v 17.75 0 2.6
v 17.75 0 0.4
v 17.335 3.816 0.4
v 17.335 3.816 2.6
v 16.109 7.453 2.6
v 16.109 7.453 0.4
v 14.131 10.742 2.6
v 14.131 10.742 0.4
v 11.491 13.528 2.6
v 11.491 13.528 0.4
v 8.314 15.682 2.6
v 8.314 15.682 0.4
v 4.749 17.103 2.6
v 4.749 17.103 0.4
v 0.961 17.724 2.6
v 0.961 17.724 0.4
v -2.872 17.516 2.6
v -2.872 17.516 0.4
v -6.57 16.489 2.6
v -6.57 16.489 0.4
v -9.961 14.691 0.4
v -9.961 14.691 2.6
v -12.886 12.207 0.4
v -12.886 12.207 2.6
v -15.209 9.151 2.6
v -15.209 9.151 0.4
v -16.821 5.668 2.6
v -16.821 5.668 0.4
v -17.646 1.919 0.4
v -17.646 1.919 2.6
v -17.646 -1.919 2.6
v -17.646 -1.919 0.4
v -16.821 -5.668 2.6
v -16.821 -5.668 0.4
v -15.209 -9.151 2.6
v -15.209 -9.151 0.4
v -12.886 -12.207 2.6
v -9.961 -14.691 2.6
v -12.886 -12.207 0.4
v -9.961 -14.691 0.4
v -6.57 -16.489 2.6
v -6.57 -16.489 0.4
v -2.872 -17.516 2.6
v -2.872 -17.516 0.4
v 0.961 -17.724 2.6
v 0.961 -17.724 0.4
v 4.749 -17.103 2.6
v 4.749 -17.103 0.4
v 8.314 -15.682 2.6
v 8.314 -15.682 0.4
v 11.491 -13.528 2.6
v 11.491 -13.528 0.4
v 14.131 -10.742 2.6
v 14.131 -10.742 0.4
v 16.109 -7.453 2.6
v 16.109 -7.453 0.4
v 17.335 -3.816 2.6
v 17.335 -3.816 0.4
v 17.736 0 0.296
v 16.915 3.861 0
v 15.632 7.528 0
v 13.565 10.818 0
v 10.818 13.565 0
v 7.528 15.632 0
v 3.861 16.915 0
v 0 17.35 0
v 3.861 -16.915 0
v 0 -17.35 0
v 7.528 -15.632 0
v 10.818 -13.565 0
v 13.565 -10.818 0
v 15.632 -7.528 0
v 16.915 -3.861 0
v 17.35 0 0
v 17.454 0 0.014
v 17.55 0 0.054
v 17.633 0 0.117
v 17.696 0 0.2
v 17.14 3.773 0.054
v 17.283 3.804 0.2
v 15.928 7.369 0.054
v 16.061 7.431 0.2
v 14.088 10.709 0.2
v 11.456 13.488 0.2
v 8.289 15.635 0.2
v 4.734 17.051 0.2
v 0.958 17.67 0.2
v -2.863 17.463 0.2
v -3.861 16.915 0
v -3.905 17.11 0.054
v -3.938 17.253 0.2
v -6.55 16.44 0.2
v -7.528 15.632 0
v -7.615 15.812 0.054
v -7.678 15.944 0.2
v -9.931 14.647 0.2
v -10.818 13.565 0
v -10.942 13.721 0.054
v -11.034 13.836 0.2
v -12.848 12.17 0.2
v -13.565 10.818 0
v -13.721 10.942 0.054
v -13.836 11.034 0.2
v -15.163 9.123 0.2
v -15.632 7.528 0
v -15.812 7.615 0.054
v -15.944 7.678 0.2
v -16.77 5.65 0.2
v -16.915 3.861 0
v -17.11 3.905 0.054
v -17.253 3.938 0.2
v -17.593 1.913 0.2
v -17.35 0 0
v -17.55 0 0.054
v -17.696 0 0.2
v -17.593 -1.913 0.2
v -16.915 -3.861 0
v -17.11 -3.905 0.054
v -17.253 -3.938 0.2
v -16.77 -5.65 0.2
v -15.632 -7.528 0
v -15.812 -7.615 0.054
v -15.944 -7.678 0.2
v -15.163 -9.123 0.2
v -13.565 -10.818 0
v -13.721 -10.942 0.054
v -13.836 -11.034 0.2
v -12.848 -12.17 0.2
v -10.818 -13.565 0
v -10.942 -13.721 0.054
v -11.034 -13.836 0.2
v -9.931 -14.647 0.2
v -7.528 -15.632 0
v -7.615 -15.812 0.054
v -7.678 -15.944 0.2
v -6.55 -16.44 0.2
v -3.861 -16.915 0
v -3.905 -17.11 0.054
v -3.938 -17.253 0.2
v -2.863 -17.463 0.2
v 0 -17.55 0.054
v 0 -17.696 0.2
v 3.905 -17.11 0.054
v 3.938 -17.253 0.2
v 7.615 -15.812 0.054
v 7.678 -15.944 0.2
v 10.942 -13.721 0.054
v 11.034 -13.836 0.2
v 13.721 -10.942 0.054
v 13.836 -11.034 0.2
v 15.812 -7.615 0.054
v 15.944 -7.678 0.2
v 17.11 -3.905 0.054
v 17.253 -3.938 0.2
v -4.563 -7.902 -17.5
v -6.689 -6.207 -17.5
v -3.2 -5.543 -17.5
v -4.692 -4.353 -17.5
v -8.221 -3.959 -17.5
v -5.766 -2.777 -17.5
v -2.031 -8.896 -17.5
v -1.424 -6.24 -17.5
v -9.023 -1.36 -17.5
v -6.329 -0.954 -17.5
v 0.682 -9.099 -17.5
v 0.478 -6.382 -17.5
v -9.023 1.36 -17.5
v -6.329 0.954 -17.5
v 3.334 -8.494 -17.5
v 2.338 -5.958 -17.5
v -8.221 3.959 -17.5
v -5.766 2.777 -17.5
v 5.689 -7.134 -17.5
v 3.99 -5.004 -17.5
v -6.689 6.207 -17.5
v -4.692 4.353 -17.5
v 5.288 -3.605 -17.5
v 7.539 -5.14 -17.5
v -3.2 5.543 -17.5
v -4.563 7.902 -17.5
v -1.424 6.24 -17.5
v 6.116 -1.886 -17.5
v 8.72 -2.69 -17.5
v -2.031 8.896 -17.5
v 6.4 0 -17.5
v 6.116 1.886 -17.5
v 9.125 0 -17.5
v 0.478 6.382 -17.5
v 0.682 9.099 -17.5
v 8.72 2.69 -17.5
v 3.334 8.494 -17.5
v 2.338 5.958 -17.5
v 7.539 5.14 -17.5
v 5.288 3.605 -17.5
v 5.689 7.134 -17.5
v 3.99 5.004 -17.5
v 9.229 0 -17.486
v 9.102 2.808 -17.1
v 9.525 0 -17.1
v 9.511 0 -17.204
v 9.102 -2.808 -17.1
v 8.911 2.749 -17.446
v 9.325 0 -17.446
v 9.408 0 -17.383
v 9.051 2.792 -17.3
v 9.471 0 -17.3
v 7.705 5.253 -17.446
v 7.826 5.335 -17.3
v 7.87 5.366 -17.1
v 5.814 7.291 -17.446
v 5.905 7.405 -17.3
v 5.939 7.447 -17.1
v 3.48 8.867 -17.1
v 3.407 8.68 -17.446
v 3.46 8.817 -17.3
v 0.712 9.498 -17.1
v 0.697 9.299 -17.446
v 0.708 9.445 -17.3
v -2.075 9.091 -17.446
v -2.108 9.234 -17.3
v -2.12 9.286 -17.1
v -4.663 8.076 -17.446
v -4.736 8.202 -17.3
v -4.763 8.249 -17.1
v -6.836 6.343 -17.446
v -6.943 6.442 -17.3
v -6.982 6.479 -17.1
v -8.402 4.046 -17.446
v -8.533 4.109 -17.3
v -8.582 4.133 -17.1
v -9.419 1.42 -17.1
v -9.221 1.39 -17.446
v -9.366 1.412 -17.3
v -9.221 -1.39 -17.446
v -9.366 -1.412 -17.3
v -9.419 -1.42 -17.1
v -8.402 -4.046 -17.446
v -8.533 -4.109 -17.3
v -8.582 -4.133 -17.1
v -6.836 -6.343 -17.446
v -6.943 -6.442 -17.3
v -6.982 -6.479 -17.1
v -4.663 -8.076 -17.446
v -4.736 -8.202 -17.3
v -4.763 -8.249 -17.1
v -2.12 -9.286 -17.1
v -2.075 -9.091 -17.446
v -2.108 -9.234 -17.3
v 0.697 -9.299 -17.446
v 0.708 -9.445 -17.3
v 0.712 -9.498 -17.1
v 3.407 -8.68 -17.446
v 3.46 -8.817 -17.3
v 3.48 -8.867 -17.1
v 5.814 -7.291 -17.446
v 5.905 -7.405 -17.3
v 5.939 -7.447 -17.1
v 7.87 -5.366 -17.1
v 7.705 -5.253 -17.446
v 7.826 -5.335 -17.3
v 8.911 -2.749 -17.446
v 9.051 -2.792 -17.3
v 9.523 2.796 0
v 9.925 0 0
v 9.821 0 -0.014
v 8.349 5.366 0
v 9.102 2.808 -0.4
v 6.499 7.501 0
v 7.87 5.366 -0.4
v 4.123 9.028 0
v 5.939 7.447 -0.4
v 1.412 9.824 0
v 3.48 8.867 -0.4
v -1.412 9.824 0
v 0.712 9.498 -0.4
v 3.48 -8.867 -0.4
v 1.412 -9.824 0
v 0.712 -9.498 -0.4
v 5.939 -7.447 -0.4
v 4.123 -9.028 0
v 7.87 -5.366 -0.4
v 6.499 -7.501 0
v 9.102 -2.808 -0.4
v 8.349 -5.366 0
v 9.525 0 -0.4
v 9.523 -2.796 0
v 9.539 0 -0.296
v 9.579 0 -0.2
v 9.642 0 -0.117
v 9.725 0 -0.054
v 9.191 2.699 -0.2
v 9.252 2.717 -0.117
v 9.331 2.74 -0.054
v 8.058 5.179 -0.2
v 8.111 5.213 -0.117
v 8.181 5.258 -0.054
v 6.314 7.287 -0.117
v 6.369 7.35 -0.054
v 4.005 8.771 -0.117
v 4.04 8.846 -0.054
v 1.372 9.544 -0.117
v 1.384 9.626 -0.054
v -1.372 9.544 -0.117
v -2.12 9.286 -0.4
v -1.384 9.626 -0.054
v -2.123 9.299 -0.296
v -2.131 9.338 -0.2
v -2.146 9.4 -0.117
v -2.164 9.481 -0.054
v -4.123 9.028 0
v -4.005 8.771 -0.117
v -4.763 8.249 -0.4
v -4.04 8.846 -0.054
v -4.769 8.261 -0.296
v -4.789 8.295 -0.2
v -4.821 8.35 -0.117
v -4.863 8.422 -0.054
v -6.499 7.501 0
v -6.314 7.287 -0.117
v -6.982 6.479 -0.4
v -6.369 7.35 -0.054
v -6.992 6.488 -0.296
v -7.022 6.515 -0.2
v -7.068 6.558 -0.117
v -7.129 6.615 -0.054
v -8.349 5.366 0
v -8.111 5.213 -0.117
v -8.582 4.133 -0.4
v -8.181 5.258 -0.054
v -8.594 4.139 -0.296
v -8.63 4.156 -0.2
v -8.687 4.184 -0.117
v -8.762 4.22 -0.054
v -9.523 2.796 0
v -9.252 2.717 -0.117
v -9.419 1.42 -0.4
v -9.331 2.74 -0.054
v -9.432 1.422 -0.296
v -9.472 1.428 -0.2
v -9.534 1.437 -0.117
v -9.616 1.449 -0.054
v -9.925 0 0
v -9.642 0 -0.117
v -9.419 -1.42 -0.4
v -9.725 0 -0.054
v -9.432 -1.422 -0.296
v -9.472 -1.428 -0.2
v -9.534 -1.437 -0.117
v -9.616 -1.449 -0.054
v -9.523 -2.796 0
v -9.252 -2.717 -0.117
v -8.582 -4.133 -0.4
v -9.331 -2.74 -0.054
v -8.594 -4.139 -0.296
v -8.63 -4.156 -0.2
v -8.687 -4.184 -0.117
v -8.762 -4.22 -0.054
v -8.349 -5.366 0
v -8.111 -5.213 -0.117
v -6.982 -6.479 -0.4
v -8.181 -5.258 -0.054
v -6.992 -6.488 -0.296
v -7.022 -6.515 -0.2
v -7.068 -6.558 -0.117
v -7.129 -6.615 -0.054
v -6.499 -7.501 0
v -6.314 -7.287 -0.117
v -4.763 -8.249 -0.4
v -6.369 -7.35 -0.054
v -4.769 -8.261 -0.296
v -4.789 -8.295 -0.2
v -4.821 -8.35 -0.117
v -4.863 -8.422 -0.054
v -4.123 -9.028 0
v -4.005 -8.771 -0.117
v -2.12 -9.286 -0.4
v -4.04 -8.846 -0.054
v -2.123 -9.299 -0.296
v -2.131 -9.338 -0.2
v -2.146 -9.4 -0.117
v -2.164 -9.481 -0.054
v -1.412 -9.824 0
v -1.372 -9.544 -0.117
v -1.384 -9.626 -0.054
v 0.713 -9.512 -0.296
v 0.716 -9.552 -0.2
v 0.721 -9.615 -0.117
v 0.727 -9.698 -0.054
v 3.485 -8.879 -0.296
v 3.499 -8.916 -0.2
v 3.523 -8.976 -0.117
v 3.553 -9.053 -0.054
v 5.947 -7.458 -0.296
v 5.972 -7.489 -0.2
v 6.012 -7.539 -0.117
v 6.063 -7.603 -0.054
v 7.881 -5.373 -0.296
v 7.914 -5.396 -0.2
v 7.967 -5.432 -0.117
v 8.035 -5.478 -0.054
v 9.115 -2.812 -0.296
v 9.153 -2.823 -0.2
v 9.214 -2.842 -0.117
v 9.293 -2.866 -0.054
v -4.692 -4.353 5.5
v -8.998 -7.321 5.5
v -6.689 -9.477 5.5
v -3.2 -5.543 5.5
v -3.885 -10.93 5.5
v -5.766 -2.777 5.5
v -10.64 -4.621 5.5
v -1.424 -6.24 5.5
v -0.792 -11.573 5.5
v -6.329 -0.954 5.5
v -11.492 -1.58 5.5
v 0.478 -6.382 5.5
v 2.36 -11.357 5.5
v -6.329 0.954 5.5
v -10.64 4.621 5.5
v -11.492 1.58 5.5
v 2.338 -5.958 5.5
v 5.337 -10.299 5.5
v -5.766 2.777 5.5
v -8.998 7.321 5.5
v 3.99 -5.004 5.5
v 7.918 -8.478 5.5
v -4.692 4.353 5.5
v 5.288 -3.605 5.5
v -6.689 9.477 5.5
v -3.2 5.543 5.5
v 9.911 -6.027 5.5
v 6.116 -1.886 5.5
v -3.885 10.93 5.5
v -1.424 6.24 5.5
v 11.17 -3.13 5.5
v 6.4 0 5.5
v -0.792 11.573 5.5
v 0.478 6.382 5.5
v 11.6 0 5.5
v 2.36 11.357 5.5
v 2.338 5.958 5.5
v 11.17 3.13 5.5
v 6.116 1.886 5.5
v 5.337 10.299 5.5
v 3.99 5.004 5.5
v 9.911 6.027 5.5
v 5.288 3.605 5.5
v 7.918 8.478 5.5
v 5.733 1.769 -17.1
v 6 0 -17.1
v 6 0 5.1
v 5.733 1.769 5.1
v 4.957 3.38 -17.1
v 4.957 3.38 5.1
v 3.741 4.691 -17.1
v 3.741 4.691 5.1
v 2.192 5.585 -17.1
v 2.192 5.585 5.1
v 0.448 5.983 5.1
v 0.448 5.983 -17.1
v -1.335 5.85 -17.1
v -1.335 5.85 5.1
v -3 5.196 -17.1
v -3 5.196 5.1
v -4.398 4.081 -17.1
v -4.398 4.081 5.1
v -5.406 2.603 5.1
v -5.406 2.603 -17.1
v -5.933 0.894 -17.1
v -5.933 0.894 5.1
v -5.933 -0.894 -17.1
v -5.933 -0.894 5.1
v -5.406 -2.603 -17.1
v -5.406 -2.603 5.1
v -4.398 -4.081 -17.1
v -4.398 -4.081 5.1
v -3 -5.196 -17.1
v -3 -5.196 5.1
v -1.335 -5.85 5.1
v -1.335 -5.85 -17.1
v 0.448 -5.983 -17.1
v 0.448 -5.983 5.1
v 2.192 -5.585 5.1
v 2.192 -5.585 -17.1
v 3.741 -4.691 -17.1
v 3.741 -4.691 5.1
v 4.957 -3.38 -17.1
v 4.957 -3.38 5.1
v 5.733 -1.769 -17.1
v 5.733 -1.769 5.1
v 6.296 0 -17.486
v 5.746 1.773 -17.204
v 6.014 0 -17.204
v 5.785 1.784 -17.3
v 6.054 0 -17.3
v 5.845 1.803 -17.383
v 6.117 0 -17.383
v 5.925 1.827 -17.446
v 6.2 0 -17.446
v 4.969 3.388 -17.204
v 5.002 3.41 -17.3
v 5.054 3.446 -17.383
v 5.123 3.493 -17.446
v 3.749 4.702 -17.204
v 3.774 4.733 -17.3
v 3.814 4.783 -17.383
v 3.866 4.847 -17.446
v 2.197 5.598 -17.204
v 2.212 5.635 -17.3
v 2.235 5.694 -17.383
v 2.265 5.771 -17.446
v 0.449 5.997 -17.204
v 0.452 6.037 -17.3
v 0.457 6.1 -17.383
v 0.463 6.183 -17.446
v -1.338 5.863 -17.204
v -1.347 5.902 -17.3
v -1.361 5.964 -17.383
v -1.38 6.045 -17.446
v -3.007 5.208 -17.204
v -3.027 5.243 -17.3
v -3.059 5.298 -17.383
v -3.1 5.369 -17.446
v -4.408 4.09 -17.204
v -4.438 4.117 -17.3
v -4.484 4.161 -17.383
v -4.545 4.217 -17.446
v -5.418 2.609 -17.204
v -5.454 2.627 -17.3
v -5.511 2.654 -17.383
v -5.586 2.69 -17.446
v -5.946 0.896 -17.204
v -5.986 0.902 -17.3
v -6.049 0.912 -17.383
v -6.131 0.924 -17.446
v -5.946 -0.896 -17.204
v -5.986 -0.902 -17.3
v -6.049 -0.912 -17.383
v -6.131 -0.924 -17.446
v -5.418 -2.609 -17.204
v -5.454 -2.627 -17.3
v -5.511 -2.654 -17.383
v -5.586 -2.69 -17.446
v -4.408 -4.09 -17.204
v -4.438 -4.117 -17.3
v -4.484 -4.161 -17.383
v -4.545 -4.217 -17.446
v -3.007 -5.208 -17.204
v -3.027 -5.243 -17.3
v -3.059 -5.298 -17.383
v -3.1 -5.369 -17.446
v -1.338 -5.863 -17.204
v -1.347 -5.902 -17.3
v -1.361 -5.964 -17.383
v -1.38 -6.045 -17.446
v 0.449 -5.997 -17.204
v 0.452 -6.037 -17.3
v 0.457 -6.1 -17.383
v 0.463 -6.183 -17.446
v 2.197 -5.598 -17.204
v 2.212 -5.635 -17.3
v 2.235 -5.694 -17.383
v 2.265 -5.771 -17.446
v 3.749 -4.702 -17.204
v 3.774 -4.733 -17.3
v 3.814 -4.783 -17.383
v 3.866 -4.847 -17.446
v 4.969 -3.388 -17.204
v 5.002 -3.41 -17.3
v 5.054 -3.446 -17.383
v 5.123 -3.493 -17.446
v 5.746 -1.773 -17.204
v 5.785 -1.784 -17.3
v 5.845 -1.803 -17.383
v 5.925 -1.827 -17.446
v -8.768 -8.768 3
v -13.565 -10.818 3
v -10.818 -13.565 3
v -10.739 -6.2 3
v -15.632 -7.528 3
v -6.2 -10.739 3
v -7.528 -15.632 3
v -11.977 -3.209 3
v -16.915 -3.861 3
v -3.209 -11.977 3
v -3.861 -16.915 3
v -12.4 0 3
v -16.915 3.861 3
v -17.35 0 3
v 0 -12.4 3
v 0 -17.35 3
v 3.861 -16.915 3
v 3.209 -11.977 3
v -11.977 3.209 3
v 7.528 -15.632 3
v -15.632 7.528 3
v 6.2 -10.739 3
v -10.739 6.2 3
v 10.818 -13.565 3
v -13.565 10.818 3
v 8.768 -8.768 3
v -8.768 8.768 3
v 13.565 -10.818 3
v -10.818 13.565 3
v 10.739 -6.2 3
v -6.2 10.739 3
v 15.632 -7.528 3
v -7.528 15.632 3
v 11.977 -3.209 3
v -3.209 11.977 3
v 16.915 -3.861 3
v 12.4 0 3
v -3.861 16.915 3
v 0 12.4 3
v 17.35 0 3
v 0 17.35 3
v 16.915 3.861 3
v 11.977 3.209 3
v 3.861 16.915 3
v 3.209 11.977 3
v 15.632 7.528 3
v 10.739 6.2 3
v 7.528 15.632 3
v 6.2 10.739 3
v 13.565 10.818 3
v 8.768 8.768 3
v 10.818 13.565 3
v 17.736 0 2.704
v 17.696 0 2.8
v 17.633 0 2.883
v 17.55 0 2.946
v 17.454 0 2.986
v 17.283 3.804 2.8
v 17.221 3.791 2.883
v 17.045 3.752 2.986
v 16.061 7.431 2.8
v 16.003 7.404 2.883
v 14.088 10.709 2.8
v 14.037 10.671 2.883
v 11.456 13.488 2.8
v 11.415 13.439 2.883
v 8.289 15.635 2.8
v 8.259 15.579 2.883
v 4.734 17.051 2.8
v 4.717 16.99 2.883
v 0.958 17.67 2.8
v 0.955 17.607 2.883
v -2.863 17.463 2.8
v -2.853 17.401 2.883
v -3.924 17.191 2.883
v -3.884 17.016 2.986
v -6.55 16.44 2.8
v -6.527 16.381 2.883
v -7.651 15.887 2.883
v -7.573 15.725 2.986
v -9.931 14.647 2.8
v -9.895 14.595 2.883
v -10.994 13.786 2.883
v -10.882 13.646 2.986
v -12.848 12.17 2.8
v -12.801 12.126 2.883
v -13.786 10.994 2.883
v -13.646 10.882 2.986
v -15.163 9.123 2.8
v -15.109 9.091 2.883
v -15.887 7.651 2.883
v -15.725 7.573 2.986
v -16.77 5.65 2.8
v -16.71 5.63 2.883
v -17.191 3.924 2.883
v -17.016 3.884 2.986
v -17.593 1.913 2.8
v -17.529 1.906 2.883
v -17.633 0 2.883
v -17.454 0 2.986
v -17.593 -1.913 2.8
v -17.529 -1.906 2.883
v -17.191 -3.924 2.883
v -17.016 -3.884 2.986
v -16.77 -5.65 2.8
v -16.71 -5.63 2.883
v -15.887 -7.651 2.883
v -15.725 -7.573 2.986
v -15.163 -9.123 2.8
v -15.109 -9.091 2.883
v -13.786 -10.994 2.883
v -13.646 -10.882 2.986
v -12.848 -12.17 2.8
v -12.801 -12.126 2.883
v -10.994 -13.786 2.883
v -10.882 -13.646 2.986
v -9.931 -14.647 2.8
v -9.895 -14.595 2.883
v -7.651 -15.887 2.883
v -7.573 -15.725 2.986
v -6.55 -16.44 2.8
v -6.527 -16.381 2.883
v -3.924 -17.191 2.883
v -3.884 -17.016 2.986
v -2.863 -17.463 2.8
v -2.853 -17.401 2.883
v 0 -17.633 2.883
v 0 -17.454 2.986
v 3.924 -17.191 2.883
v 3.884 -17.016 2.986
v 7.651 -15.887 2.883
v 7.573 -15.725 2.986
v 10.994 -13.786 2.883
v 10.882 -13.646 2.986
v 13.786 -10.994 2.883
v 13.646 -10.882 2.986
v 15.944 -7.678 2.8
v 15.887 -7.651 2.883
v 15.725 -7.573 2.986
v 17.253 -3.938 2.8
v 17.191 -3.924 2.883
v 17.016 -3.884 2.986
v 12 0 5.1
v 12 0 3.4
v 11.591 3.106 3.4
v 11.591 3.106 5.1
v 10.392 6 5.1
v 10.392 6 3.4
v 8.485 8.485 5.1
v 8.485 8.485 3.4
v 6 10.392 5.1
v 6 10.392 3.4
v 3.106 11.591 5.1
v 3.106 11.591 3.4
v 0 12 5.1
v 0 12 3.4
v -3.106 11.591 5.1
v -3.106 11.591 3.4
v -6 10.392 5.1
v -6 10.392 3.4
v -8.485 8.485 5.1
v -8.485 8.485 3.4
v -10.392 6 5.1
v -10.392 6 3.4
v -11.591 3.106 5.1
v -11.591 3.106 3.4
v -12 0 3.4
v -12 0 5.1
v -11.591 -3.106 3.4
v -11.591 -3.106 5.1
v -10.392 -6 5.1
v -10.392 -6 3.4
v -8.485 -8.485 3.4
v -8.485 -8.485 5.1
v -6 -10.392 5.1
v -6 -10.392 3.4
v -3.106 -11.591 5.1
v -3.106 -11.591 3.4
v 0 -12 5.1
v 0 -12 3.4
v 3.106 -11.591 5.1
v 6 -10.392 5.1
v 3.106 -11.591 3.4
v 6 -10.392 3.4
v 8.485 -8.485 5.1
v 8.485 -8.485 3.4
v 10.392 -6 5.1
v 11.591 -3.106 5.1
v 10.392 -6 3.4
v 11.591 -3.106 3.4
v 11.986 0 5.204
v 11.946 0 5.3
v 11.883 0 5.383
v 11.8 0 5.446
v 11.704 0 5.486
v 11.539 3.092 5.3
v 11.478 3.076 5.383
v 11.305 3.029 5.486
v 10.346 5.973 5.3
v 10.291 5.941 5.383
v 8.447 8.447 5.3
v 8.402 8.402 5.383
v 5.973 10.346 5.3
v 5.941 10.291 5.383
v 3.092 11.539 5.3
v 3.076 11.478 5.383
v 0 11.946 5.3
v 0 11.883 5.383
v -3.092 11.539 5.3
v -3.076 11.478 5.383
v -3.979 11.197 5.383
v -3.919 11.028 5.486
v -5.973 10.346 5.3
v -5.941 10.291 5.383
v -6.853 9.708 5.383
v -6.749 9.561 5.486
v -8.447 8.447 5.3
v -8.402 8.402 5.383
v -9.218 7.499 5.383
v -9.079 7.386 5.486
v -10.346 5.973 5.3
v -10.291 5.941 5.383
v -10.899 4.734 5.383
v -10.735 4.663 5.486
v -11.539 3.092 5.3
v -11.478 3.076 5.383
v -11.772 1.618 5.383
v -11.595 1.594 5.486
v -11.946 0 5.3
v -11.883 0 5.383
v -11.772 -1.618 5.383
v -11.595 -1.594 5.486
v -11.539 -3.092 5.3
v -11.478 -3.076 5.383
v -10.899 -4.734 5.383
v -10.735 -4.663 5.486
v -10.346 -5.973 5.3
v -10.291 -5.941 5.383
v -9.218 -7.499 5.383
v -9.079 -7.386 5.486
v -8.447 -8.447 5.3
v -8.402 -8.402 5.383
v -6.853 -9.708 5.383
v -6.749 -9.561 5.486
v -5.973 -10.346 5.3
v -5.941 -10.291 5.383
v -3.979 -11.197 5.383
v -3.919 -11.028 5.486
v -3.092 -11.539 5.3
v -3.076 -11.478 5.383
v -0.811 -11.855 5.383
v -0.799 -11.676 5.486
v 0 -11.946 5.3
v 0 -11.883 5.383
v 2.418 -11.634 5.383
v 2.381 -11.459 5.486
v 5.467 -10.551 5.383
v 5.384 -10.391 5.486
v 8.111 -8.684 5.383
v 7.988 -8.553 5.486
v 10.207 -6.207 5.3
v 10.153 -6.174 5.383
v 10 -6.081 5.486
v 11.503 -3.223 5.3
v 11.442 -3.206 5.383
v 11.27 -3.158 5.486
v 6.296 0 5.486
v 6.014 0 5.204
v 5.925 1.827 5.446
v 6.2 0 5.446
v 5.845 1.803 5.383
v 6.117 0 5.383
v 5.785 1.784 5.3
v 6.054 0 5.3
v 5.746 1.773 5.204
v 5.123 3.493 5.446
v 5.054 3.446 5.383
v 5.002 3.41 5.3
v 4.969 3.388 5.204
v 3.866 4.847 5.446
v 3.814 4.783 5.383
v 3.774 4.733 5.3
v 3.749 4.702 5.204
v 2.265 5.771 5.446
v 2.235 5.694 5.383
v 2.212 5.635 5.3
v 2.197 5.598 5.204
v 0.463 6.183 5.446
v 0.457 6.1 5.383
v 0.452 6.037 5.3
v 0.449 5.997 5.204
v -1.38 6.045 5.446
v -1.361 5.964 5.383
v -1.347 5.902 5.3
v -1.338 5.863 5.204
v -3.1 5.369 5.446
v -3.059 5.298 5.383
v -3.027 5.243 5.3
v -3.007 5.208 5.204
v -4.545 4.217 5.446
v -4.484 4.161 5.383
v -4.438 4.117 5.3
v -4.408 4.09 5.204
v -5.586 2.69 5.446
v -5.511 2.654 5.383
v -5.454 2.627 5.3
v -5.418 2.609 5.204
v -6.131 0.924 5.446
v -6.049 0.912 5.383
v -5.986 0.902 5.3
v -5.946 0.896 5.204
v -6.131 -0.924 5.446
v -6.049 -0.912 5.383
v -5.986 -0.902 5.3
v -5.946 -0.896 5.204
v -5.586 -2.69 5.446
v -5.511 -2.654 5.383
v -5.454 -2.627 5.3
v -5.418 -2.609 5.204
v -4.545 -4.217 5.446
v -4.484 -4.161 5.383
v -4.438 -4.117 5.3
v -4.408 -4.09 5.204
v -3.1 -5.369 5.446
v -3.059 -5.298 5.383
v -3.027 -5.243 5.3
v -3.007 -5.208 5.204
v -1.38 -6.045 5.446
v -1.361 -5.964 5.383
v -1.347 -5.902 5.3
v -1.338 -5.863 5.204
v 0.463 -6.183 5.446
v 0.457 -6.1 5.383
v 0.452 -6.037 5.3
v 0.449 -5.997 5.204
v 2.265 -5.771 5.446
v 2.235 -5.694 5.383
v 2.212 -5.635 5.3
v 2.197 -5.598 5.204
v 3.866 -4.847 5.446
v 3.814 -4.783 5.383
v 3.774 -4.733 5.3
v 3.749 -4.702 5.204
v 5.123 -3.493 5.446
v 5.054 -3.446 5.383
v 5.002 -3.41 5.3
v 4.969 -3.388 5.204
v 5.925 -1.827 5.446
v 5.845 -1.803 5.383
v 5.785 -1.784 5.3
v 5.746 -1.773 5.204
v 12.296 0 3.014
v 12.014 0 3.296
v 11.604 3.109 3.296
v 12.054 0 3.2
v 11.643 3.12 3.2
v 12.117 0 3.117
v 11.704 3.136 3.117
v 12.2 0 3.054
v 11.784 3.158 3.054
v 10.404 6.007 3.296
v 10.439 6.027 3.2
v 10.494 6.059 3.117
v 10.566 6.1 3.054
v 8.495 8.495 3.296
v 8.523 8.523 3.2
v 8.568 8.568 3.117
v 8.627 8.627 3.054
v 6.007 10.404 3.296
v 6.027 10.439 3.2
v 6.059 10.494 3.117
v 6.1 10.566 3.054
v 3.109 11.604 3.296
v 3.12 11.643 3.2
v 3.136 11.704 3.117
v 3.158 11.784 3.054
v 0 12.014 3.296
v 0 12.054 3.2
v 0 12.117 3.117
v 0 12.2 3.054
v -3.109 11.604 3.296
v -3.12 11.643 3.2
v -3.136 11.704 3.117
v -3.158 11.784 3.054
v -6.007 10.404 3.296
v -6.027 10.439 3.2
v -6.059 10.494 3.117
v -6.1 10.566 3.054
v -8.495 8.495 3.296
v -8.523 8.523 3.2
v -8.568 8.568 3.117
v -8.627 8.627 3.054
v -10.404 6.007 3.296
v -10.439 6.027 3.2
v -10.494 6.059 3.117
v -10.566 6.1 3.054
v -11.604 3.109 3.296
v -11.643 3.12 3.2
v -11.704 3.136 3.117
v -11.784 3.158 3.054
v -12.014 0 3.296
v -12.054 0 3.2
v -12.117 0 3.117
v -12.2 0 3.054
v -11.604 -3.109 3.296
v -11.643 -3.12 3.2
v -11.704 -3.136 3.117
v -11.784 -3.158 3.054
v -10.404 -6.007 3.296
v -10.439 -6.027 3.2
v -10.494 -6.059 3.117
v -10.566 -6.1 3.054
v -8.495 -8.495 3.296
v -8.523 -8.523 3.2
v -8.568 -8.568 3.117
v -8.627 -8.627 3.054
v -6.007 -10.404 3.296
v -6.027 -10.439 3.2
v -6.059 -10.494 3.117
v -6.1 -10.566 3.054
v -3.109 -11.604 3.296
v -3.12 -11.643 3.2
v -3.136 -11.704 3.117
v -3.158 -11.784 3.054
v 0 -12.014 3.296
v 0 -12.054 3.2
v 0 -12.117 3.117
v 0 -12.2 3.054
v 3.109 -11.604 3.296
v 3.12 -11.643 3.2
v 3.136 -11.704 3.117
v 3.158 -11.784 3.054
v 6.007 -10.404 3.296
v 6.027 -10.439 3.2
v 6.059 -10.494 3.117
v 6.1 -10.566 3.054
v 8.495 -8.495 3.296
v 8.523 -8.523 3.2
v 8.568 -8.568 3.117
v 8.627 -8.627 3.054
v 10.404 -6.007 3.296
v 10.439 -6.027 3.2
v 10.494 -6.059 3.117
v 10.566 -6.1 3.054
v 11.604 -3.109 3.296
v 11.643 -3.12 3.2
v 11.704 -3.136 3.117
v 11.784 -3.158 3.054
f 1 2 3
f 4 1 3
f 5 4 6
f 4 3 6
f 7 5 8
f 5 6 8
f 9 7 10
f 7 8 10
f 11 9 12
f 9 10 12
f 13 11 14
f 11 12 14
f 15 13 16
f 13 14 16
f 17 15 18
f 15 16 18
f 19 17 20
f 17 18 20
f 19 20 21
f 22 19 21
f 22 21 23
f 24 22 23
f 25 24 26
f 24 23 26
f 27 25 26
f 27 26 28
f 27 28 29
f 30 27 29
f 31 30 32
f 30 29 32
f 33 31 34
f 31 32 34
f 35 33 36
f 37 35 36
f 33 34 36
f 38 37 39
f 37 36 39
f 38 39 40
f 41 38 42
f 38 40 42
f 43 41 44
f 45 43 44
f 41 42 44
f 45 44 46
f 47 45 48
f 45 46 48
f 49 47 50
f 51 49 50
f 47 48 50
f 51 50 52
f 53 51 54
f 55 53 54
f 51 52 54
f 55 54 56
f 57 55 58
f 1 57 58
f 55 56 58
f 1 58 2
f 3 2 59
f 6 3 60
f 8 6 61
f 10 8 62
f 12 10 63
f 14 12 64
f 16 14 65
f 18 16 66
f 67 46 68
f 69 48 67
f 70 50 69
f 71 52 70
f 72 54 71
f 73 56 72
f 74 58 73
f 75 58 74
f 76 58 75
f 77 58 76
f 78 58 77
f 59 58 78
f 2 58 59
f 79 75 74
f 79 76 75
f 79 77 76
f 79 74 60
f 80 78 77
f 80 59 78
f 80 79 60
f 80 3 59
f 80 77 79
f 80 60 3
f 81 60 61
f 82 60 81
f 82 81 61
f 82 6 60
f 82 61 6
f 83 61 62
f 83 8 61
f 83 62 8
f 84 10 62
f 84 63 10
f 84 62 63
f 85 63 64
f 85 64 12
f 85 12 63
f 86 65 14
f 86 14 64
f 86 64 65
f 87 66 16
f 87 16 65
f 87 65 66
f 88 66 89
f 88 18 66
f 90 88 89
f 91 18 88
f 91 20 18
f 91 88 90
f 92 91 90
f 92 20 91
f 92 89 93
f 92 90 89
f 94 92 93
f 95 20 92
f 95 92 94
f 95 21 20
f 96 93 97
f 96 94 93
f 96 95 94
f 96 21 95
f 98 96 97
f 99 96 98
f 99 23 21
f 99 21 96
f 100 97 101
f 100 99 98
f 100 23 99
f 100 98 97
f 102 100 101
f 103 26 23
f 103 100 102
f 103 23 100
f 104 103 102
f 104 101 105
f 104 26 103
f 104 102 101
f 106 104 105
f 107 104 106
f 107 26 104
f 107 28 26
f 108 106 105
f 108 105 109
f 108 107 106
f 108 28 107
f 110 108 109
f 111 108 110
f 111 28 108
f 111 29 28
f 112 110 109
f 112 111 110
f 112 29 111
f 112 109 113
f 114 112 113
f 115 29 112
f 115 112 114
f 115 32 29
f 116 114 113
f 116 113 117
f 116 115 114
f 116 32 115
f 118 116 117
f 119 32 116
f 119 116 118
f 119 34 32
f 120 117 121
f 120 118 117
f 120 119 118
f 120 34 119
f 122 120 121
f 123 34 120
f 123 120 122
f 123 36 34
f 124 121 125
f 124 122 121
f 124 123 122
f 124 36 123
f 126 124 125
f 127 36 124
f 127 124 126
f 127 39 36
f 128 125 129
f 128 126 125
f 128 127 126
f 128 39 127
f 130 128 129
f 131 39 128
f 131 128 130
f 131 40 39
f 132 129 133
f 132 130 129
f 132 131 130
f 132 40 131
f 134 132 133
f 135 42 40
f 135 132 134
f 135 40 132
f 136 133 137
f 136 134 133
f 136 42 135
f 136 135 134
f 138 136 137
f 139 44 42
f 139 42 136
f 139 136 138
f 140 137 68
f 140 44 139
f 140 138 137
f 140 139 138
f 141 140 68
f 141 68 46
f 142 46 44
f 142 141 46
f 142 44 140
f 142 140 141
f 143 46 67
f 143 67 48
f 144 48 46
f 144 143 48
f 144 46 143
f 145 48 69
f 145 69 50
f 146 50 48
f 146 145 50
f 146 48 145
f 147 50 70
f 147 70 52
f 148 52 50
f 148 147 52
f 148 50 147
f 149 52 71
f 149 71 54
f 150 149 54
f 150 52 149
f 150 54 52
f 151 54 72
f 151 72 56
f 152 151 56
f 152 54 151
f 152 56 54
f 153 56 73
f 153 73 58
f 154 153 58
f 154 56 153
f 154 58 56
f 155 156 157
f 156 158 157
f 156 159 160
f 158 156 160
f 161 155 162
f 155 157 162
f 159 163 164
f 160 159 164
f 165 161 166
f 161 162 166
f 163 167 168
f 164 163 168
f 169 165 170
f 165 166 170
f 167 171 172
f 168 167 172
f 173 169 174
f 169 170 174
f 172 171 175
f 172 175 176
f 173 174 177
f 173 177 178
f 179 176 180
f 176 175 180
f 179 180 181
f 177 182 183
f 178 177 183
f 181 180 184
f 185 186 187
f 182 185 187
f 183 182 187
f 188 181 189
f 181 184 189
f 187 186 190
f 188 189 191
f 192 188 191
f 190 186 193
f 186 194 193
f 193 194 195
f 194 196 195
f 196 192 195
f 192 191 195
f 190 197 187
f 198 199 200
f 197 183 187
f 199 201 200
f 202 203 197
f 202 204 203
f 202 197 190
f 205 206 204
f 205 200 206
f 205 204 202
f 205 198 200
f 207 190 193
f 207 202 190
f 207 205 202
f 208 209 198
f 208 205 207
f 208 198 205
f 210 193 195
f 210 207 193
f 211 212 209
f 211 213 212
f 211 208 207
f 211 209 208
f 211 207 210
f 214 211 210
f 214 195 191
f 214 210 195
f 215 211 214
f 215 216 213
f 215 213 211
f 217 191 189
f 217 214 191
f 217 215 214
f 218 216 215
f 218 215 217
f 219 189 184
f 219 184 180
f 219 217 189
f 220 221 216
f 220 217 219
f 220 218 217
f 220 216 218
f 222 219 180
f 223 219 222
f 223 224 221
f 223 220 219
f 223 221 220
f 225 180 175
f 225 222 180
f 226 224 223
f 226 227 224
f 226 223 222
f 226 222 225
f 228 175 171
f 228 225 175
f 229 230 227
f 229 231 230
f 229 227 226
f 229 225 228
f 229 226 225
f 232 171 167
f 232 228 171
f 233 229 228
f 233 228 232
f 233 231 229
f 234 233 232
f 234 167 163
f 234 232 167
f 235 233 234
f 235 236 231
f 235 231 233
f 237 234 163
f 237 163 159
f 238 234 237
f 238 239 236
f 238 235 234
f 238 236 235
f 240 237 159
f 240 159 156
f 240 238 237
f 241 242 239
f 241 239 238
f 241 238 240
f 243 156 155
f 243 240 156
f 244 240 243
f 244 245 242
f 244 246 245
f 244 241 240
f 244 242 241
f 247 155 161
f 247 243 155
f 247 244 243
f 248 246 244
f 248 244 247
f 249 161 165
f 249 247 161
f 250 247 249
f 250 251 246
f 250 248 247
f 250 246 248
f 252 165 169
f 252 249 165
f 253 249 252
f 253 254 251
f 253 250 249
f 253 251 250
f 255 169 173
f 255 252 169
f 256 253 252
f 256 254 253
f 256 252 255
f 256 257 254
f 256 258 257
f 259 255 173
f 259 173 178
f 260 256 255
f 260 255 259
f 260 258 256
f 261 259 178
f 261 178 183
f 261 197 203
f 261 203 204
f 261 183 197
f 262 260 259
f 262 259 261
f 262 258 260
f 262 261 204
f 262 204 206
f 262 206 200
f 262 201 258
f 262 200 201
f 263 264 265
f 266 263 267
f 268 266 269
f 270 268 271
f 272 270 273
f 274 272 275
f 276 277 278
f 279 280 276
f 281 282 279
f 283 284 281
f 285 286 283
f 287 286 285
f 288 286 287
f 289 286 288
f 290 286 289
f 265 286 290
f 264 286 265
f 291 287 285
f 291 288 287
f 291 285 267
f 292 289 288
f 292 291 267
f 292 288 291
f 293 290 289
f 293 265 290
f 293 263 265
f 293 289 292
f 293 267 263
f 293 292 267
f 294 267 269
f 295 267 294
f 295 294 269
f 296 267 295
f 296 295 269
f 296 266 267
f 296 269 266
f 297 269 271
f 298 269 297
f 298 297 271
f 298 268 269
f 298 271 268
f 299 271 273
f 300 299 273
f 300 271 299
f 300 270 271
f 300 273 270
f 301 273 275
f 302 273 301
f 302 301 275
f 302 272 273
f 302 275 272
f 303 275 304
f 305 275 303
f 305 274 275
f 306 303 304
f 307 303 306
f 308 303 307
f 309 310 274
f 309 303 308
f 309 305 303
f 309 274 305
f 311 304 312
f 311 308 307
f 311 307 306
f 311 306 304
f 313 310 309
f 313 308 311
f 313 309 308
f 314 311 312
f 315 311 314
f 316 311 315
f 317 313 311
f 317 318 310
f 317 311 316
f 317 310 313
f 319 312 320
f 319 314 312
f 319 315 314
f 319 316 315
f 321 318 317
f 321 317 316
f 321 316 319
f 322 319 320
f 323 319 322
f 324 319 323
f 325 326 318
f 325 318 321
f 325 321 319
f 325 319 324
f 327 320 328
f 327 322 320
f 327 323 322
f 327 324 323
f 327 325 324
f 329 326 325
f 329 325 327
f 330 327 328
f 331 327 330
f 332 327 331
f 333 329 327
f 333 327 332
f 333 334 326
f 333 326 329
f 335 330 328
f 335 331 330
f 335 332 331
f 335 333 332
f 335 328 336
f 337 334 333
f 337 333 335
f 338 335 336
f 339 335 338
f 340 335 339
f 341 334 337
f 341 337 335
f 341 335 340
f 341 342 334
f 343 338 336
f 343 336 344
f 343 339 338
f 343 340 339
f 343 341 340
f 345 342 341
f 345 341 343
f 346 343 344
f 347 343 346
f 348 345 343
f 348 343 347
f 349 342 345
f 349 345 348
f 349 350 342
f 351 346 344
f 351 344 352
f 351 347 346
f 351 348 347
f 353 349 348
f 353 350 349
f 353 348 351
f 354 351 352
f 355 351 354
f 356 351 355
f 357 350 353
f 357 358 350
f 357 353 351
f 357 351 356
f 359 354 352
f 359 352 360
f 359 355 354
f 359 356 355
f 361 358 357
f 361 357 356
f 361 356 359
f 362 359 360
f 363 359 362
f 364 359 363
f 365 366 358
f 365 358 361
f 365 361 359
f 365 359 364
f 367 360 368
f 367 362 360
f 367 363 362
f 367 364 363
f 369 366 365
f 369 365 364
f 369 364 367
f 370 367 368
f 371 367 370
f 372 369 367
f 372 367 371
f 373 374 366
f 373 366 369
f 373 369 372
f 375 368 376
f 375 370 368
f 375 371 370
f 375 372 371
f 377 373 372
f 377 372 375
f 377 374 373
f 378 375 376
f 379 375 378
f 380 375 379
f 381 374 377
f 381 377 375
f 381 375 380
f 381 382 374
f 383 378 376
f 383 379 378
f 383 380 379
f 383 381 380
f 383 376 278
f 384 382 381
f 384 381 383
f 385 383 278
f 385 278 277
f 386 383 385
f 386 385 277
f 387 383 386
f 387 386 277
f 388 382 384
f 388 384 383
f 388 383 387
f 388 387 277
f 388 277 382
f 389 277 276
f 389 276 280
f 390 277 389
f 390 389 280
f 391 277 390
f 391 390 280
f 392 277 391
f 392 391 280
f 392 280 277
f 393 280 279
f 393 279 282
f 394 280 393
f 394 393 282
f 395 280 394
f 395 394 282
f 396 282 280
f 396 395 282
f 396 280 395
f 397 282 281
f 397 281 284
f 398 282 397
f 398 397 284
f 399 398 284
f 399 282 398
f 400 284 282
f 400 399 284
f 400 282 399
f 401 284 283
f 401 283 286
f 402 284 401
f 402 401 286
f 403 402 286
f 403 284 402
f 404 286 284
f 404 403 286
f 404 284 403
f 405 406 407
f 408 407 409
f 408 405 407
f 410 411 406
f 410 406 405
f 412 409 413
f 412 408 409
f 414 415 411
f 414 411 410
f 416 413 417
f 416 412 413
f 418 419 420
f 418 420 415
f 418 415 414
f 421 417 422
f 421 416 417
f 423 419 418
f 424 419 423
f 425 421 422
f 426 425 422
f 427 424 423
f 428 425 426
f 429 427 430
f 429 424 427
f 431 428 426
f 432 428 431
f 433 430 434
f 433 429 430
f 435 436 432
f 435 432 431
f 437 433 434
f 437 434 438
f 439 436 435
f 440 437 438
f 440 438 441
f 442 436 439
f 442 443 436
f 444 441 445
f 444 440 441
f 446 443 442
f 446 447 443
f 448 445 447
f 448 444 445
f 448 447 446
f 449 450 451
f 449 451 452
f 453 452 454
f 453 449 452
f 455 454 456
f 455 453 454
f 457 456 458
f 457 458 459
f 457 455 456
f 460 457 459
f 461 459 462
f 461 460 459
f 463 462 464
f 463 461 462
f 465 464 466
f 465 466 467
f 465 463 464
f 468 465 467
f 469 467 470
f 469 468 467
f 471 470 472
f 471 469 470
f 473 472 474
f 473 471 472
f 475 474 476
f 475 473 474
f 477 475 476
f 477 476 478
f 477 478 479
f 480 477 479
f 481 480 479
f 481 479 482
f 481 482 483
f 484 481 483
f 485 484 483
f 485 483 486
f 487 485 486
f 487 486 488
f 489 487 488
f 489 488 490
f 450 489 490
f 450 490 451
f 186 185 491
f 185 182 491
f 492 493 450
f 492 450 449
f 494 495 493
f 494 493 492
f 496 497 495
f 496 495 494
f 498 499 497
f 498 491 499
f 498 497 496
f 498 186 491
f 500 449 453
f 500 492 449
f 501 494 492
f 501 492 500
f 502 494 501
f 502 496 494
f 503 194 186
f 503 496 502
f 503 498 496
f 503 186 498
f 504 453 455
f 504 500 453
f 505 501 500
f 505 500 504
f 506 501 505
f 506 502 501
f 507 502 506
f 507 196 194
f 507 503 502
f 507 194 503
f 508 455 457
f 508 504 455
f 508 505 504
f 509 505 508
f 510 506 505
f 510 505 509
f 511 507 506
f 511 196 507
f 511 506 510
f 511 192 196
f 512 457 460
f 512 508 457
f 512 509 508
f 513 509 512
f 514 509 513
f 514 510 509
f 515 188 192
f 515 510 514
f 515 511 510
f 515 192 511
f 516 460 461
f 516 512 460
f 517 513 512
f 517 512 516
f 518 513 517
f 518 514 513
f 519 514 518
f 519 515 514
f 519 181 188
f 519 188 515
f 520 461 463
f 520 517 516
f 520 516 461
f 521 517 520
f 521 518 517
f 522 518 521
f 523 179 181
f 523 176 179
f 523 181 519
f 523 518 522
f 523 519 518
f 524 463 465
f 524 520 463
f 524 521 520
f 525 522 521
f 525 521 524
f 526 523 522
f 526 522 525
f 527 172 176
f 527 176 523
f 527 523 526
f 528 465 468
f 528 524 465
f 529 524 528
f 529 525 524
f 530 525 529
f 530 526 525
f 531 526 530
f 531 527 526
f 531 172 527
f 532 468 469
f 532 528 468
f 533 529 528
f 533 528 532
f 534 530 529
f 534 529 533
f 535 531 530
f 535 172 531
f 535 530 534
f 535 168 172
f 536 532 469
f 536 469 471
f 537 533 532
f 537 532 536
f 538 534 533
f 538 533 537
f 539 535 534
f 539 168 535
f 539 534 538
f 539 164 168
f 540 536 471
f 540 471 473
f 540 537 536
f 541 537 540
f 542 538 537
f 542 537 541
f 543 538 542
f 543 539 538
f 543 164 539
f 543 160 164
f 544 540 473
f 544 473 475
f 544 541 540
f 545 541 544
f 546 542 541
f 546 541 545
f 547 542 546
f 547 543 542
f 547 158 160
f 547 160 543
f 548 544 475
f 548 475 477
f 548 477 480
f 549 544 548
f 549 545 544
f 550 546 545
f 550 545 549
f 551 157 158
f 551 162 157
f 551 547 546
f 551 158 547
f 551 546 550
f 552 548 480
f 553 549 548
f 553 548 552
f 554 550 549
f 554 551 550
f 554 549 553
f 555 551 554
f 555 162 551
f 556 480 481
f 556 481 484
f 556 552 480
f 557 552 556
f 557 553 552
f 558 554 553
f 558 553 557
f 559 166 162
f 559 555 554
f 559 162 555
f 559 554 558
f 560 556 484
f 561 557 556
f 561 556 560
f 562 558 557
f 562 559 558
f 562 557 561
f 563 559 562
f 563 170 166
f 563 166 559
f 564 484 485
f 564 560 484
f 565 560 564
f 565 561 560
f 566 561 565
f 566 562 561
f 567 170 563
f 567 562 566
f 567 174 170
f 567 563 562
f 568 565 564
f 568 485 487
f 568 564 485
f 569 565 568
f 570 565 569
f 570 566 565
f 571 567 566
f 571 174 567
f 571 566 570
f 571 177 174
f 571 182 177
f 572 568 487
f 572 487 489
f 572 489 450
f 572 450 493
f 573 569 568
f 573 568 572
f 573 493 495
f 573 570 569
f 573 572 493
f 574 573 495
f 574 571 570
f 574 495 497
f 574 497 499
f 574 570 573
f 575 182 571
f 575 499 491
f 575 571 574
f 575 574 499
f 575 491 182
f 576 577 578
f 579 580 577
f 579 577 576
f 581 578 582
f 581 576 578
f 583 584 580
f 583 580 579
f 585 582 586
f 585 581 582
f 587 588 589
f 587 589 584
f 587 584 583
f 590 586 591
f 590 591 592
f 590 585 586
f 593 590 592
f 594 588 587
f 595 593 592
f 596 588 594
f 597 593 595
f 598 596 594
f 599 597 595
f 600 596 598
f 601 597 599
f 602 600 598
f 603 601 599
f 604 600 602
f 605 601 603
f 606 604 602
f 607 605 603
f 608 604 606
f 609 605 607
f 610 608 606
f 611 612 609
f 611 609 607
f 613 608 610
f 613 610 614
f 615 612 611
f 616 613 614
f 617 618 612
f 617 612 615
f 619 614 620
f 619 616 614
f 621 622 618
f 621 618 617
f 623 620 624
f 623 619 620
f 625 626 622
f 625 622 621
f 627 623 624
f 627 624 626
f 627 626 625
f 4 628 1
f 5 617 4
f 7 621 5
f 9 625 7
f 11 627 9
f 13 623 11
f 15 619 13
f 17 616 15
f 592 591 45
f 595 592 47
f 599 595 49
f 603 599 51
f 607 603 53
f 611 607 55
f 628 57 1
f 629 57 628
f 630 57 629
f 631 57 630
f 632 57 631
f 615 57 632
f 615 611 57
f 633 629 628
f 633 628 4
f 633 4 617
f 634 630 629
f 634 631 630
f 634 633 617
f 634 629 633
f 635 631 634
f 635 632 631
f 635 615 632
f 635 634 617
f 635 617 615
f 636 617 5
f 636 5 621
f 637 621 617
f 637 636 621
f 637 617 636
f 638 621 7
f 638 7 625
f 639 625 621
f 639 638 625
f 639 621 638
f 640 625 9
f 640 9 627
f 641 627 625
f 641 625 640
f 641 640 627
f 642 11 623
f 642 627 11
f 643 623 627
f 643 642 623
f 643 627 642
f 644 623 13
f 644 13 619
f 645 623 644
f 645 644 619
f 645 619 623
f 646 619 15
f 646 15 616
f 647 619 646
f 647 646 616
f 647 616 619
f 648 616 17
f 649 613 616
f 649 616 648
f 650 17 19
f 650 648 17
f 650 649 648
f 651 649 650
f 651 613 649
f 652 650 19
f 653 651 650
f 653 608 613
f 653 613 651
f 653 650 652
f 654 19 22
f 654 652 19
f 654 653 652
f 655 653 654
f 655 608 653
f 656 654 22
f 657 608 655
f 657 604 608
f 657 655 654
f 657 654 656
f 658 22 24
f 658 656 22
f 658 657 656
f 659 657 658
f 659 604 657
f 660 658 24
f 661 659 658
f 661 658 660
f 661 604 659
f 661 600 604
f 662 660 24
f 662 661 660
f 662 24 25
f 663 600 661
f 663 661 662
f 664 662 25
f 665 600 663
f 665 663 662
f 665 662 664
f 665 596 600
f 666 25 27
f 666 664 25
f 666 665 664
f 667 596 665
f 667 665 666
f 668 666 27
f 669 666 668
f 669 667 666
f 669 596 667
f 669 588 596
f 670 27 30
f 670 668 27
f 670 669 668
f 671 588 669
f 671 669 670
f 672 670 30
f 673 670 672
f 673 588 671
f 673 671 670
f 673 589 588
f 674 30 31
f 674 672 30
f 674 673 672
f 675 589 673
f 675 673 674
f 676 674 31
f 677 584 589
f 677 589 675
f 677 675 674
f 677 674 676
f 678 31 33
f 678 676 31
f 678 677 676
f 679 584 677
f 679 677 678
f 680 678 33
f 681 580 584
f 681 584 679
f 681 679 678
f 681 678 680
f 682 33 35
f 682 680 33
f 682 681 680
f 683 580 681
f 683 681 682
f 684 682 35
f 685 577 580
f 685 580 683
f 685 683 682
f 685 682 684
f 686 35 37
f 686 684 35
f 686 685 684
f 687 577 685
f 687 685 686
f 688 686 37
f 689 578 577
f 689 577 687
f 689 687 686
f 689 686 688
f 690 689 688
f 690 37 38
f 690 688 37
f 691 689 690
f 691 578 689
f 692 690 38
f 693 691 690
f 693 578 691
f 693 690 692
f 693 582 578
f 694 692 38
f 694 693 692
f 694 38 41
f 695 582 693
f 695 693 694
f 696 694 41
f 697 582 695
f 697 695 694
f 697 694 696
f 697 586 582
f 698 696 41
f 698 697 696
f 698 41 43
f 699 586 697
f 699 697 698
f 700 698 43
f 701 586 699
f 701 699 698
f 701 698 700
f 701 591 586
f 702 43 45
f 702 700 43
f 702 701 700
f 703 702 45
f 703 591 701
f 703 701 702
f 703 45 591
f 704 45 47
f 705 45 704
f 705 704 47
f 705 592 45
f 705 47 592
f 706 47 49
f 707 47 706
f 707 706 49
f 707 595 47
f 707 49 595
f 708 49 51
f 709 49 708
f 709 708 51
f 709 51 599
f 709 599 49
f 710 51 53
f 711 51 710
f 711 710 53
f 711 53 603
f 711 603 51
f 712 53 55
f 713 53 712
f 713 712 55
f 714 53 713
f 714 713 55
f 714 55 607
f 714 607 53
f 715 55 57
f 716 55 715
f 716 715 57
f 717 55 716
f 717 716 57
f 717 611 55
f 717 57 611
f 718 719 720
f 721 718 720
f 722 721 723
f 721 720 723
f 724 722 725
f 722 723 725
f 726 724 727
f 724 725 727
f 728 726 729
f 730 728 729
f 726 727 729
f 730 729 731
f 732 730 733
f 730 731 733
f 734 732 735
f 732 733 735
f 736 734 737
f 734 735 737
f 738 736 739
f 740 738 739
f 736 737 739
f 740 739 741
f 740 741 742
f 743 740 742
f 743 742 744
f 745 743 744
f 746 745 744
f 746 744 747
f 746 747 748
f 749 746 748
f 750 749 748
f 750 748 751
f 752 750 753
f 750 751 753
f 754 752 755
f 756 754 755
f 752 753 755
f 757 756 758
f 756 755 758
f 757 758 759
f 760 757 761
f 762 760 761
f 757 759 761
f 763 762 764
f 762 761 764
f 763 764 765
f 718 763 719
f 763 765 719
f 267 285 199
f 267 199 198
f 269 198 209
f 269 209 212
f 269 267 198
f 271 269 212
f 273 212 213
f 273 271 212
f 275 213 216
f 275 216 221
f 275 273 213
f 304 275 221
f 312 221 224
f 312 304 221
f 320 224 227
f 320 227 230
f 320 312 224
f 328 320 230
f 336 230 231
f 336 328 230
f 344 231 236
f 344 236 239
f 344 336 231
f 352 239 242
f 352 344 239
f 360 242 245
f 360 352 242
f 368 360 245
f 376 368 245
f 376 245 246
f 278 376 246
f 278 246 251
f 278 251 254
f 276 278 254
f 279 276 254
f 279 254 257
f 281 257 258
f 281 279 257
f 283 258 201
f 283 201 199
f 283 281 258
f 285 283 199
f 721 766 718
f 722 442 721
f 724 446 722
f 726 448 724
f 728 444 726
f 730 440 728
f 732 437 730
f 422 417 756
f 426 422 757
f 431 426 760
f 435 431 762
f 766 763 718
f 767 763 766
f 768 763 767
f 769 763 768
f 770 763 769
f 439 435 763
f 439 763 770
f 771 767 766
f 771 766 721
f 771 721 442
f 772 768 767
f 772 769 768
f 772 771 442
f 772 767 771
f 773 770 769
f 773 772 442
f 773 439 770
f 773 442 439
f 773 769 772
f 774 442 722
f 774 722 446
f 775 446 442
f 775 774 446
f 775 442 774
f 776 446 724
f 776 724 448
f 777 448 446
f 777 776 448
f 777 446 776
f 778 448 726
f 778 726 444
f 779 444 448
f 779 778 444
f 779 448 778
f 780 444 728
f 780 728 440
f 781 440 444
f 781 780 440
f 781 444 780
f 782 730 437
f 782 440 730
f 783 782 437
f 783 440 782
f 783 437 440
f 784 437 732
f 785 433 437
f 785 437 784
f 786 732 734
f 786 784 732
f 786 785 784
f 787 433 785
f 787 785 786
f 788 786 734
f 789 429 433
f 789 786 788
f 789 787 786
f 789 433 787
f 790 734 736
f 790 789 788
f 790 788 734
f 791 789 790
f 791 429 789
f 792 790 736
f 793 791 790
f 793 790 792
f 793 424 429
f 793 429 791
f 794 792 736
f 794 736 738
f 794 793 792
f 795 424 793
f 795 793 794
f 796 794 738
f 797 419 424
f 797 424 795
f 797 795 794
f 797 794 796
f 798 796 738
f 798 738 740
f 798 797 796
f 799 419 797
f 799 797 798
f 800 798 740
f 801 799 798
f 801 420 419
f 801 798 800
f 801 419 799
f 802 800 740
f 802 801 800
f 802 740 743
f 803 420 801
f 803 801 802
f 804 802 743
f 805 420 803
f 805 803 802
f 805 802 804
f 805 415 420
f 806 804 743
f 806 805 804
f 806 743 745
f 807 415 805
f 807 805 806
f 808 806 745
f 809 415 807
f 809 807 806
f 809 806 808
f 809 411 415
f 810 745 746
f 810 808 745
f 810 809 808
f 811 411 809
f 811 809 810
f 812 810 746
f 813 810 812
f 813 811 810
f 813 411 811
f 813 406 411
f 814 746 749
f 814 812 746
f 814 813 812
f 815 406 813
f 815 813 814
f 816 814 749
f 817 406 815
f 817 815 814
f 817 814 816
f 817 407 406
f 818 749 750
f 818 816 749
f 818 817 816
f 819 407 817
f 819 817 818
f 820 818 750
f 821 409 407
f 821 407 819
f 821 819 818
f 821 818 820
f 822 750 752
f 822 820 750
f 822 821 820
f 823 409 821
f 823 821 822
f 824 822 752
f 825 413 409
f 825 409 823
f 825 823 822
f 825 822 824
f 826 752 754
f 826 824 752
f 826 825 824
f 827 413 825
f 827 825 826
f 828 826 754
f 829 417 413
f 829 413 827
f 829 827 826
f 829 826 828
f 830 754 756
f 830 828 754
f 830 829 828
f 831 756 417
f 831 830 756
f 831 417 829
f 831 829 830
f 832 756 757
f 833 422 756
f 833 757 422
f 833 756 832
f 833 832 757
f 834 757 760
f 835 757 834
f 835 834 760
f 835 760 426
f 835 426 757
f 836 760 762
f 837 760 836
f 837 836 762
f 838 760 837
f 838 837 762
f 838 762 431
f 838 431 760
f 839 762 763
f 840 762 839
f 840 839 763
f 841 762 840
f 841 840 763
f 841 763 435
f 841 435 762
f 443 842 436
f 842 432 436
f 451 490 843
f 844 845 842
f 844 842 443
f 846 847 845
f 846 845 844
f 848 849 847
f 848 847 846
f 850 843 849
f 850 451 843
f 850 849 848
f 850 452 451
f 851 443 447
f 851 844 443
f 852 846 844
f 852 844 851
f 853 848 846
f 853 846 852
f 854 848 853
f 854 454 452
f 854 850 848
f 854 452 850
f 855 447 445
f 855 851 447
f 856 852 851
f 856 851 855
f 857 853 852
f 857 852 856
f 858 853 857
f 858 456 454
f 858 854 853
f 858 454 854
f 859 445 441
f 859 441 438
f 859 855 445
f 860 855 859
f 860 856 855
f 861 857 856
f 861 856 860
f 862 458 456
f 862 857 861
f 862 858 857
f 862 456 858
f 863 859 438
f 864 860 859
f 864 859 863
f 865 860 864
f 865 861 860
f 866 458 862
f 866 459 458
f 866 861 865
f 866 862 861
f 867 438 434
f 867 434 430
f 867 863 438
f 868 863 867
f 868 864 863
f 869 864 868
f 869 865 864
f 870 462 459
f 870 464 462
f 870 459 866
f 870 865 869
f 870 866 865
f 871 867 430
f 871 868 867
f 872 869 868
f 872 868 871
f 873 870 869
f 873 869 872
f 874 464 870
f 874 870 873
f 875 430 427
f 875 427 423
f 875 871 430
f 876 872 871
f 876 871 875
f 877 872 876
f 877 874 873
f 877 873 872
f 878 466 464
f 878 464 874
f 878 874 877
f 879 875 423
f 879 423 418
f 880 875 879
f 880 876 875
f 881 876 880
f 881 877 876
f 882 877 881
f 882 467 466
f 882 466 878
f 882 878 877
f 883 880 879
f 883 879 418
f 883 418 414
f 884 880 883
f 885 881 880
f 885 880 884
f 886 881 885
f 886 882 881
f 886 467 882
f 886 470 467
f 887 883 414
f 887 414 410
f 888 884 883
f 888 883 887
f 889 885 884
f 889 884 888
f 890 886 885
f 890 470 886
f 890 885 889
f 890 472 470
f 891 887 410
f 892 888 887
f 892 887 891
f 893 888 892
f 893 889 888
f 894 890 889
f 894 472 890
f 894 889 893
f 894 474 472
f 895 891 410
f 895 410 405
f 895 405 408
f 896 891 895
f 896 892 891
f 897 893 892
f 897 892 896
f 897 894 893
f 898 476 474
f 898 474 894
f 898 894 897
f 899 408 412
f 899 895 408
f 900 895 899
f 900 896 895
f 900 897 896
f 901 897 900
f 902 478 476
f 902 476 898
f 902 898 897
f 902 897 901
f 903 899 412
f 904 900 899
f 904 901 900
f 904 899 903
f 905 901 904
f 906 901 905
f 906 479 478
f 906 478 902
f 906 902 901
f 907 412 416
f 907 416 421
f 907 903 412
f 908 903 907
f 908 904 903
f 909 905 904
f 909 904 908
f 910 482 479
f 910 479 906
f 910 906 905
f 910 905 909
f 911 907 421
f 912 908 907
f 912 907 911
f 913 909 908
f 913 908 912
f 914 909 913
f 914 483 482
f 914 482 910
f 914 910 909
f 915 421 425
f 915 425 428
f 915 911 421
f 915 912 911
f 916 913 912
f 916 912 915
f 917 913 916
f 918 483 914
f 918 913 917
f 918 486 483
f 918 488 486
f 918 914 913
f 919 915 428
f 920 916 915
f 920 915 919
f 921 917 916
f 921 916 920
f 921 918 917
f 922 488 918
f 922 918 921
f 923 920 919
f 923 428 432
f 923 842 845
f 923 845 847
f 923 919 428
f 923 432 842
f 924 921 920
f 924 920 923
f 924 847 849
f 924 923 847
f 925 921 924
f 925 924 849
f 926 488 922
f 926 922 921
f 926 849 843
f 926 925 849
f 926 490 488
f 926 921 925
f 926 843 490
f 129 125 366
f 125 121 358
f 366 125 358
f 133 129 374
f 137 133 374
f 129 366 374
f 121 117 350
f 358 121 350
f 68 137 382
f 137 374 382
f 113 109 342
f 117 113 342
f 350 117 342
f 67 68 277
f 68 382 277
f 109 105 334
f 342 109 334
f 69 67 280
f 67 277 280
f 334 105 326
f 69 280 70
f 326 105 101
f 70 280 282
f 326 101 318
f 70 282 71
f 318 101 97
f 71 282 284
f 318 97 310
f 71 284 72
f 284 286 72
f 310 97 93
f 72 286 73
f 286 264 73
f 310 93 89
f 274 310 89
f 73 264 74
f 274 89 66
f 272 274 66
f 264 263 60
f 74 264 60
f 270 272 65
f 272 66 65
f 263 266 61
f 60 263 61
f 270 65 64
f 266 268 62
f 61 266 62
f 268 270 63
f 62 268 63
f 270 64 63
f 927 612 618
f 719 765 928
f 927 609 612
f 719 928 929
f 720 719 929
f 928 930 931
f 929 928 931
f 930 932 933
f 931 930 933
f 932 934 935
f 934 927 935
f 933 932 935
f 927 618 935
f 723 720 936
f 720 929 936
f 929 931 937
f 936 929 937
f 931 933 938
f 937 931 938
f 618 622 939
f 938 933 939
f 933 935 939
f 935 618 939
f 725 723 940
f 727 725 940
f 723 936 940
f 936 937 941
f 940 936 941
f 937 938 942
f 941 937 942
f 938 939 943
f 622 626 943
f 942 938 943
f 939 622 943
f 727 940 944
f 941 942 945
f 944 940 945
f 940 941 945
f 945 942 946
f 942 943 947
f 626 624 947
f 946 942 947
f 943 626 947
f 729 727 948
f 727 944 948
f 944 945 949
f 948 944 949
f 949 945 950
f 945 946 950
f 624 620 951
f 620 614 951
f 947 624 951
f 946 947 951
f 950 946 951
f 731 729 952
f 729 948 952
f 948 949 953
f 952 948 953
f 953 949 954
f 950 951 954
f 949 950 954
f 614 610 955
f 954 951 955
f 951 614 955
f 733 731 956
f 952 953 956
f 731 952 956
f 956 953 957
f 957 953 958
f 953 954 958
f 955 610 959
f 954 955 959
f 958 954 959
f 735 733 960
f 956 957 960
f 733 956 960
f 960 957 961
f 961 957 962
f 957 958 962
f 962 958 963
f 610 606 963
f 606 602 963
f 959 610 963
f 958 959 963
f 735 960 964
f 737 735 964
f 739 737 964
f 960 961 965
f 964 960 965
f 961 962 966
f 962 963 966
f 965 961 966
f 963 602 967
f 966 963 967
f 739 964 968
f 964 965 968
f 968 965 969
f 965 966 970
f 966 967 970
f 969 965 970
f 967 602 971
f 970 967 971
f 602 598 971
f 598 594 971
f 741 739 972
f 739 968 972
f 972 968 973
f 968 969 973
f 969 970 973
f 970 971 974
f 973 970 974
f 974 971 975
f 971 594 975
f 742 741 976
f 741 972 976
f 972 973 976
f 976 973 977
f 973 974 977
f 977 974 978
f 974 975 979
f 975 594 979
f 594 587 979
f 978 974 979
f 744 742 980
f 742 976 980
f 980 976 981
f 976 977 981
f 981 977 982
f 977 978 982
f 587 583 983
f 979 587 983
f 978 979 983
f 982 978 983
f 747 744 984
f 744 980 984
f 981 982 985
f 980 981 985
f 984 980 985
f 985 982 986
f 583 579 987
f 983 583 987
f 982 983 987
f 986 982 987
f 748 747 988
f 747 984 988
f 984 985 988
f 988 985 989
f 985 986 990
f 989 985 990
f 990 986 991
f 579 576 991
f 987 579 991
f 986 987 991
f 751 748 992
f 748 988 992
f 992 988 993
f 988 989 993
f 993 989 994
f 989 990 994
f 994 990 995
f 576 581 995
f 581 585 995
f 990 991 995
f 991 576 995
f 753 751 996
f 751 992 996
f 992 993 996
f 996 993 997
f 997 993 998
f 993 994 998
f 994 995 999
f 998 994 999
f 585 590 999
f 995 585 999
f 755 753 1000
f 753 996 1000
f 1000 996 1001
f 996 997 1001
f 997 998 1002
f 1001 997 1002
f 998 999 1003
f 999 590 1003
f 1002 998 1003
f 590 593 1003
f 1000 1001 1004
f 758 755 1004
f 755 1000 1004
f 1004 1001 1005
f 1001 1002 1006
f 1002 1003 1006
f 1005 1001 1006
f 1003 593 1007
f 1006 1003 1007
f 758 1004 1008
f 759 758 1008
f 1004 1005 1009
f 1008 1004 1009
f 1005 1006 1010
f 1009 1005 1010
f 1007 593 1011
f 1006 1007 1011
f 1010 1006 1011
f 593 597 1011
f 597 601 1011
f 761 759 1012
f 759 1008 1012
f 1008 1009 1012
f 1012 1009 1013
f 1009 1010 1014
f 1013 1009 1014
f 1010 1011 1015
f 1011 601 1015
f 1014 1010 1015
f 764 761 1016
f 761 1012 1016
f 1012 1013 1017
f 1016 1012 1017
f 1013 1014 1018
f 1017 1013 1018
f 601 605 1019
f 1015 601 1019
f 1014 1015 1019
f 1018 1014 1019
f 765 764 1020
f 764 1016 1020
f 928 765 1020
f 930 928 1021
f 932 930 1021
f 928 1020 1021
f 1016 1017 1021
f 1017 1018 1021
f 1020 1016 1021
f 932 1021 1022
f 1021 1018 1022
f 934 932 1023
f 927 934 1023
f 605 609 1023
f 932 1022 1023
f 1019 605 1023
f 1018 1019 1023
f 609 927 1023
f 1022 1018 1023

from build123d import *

# Parameters (mm, degrees)
F0_R     = 9.525
F0_R_2   = 6
F1_DEPTH = 17.5
F2_R     = 17.75
F2_R_2   = 6
F3_DEPTH = 3
F4_R     = 12
F4_R_2   = 6
F5_DEPTH = 2.5
F6_R     = 0.4


with BuildPart() as f1:
    # F0 (on Top) → F1 (new body)
    with BuildSketch(Plane.XY):
        Circle(F0_R)
        Circle(F0_R_2, mode=Mode.SUBTRACT)
    extrude(amount=-F1_DEPTH)

    # F2 (on Top) → F3 (join)
    with BuildSketch(Plane.XY):
        Circle(F2_R)
        Circle(F2_R_2, mode=Mode.SUBTRACT)
    extrude(amount=F3_DEPTH)

    # F4 (on face) → F5 (join)
    with BuildSketch(Plane.XY.offset(3)):
        Circle(F4_R)
        Circle(F4_R_2, mode=Mode.SUBTRACT)
    extrude(amount=F5_DEPTH)

    # F6
    f6_edges = [f1.edges().sort_by_distance(p)[0] for p in [
        (-12, 0, 5.5),
        (-6, 0, 5.5),
        (-17.75, 0, 3),
        (-12, 0, 3),
        (-17.75, 0, 0),
        (-9.525, 0, 0),
        (-9.525, 0, -17.5),
        (-6, 0, -17.5),
    ]]
    fillet(f6_edges, radius=F6_R)


solid = f1.part
